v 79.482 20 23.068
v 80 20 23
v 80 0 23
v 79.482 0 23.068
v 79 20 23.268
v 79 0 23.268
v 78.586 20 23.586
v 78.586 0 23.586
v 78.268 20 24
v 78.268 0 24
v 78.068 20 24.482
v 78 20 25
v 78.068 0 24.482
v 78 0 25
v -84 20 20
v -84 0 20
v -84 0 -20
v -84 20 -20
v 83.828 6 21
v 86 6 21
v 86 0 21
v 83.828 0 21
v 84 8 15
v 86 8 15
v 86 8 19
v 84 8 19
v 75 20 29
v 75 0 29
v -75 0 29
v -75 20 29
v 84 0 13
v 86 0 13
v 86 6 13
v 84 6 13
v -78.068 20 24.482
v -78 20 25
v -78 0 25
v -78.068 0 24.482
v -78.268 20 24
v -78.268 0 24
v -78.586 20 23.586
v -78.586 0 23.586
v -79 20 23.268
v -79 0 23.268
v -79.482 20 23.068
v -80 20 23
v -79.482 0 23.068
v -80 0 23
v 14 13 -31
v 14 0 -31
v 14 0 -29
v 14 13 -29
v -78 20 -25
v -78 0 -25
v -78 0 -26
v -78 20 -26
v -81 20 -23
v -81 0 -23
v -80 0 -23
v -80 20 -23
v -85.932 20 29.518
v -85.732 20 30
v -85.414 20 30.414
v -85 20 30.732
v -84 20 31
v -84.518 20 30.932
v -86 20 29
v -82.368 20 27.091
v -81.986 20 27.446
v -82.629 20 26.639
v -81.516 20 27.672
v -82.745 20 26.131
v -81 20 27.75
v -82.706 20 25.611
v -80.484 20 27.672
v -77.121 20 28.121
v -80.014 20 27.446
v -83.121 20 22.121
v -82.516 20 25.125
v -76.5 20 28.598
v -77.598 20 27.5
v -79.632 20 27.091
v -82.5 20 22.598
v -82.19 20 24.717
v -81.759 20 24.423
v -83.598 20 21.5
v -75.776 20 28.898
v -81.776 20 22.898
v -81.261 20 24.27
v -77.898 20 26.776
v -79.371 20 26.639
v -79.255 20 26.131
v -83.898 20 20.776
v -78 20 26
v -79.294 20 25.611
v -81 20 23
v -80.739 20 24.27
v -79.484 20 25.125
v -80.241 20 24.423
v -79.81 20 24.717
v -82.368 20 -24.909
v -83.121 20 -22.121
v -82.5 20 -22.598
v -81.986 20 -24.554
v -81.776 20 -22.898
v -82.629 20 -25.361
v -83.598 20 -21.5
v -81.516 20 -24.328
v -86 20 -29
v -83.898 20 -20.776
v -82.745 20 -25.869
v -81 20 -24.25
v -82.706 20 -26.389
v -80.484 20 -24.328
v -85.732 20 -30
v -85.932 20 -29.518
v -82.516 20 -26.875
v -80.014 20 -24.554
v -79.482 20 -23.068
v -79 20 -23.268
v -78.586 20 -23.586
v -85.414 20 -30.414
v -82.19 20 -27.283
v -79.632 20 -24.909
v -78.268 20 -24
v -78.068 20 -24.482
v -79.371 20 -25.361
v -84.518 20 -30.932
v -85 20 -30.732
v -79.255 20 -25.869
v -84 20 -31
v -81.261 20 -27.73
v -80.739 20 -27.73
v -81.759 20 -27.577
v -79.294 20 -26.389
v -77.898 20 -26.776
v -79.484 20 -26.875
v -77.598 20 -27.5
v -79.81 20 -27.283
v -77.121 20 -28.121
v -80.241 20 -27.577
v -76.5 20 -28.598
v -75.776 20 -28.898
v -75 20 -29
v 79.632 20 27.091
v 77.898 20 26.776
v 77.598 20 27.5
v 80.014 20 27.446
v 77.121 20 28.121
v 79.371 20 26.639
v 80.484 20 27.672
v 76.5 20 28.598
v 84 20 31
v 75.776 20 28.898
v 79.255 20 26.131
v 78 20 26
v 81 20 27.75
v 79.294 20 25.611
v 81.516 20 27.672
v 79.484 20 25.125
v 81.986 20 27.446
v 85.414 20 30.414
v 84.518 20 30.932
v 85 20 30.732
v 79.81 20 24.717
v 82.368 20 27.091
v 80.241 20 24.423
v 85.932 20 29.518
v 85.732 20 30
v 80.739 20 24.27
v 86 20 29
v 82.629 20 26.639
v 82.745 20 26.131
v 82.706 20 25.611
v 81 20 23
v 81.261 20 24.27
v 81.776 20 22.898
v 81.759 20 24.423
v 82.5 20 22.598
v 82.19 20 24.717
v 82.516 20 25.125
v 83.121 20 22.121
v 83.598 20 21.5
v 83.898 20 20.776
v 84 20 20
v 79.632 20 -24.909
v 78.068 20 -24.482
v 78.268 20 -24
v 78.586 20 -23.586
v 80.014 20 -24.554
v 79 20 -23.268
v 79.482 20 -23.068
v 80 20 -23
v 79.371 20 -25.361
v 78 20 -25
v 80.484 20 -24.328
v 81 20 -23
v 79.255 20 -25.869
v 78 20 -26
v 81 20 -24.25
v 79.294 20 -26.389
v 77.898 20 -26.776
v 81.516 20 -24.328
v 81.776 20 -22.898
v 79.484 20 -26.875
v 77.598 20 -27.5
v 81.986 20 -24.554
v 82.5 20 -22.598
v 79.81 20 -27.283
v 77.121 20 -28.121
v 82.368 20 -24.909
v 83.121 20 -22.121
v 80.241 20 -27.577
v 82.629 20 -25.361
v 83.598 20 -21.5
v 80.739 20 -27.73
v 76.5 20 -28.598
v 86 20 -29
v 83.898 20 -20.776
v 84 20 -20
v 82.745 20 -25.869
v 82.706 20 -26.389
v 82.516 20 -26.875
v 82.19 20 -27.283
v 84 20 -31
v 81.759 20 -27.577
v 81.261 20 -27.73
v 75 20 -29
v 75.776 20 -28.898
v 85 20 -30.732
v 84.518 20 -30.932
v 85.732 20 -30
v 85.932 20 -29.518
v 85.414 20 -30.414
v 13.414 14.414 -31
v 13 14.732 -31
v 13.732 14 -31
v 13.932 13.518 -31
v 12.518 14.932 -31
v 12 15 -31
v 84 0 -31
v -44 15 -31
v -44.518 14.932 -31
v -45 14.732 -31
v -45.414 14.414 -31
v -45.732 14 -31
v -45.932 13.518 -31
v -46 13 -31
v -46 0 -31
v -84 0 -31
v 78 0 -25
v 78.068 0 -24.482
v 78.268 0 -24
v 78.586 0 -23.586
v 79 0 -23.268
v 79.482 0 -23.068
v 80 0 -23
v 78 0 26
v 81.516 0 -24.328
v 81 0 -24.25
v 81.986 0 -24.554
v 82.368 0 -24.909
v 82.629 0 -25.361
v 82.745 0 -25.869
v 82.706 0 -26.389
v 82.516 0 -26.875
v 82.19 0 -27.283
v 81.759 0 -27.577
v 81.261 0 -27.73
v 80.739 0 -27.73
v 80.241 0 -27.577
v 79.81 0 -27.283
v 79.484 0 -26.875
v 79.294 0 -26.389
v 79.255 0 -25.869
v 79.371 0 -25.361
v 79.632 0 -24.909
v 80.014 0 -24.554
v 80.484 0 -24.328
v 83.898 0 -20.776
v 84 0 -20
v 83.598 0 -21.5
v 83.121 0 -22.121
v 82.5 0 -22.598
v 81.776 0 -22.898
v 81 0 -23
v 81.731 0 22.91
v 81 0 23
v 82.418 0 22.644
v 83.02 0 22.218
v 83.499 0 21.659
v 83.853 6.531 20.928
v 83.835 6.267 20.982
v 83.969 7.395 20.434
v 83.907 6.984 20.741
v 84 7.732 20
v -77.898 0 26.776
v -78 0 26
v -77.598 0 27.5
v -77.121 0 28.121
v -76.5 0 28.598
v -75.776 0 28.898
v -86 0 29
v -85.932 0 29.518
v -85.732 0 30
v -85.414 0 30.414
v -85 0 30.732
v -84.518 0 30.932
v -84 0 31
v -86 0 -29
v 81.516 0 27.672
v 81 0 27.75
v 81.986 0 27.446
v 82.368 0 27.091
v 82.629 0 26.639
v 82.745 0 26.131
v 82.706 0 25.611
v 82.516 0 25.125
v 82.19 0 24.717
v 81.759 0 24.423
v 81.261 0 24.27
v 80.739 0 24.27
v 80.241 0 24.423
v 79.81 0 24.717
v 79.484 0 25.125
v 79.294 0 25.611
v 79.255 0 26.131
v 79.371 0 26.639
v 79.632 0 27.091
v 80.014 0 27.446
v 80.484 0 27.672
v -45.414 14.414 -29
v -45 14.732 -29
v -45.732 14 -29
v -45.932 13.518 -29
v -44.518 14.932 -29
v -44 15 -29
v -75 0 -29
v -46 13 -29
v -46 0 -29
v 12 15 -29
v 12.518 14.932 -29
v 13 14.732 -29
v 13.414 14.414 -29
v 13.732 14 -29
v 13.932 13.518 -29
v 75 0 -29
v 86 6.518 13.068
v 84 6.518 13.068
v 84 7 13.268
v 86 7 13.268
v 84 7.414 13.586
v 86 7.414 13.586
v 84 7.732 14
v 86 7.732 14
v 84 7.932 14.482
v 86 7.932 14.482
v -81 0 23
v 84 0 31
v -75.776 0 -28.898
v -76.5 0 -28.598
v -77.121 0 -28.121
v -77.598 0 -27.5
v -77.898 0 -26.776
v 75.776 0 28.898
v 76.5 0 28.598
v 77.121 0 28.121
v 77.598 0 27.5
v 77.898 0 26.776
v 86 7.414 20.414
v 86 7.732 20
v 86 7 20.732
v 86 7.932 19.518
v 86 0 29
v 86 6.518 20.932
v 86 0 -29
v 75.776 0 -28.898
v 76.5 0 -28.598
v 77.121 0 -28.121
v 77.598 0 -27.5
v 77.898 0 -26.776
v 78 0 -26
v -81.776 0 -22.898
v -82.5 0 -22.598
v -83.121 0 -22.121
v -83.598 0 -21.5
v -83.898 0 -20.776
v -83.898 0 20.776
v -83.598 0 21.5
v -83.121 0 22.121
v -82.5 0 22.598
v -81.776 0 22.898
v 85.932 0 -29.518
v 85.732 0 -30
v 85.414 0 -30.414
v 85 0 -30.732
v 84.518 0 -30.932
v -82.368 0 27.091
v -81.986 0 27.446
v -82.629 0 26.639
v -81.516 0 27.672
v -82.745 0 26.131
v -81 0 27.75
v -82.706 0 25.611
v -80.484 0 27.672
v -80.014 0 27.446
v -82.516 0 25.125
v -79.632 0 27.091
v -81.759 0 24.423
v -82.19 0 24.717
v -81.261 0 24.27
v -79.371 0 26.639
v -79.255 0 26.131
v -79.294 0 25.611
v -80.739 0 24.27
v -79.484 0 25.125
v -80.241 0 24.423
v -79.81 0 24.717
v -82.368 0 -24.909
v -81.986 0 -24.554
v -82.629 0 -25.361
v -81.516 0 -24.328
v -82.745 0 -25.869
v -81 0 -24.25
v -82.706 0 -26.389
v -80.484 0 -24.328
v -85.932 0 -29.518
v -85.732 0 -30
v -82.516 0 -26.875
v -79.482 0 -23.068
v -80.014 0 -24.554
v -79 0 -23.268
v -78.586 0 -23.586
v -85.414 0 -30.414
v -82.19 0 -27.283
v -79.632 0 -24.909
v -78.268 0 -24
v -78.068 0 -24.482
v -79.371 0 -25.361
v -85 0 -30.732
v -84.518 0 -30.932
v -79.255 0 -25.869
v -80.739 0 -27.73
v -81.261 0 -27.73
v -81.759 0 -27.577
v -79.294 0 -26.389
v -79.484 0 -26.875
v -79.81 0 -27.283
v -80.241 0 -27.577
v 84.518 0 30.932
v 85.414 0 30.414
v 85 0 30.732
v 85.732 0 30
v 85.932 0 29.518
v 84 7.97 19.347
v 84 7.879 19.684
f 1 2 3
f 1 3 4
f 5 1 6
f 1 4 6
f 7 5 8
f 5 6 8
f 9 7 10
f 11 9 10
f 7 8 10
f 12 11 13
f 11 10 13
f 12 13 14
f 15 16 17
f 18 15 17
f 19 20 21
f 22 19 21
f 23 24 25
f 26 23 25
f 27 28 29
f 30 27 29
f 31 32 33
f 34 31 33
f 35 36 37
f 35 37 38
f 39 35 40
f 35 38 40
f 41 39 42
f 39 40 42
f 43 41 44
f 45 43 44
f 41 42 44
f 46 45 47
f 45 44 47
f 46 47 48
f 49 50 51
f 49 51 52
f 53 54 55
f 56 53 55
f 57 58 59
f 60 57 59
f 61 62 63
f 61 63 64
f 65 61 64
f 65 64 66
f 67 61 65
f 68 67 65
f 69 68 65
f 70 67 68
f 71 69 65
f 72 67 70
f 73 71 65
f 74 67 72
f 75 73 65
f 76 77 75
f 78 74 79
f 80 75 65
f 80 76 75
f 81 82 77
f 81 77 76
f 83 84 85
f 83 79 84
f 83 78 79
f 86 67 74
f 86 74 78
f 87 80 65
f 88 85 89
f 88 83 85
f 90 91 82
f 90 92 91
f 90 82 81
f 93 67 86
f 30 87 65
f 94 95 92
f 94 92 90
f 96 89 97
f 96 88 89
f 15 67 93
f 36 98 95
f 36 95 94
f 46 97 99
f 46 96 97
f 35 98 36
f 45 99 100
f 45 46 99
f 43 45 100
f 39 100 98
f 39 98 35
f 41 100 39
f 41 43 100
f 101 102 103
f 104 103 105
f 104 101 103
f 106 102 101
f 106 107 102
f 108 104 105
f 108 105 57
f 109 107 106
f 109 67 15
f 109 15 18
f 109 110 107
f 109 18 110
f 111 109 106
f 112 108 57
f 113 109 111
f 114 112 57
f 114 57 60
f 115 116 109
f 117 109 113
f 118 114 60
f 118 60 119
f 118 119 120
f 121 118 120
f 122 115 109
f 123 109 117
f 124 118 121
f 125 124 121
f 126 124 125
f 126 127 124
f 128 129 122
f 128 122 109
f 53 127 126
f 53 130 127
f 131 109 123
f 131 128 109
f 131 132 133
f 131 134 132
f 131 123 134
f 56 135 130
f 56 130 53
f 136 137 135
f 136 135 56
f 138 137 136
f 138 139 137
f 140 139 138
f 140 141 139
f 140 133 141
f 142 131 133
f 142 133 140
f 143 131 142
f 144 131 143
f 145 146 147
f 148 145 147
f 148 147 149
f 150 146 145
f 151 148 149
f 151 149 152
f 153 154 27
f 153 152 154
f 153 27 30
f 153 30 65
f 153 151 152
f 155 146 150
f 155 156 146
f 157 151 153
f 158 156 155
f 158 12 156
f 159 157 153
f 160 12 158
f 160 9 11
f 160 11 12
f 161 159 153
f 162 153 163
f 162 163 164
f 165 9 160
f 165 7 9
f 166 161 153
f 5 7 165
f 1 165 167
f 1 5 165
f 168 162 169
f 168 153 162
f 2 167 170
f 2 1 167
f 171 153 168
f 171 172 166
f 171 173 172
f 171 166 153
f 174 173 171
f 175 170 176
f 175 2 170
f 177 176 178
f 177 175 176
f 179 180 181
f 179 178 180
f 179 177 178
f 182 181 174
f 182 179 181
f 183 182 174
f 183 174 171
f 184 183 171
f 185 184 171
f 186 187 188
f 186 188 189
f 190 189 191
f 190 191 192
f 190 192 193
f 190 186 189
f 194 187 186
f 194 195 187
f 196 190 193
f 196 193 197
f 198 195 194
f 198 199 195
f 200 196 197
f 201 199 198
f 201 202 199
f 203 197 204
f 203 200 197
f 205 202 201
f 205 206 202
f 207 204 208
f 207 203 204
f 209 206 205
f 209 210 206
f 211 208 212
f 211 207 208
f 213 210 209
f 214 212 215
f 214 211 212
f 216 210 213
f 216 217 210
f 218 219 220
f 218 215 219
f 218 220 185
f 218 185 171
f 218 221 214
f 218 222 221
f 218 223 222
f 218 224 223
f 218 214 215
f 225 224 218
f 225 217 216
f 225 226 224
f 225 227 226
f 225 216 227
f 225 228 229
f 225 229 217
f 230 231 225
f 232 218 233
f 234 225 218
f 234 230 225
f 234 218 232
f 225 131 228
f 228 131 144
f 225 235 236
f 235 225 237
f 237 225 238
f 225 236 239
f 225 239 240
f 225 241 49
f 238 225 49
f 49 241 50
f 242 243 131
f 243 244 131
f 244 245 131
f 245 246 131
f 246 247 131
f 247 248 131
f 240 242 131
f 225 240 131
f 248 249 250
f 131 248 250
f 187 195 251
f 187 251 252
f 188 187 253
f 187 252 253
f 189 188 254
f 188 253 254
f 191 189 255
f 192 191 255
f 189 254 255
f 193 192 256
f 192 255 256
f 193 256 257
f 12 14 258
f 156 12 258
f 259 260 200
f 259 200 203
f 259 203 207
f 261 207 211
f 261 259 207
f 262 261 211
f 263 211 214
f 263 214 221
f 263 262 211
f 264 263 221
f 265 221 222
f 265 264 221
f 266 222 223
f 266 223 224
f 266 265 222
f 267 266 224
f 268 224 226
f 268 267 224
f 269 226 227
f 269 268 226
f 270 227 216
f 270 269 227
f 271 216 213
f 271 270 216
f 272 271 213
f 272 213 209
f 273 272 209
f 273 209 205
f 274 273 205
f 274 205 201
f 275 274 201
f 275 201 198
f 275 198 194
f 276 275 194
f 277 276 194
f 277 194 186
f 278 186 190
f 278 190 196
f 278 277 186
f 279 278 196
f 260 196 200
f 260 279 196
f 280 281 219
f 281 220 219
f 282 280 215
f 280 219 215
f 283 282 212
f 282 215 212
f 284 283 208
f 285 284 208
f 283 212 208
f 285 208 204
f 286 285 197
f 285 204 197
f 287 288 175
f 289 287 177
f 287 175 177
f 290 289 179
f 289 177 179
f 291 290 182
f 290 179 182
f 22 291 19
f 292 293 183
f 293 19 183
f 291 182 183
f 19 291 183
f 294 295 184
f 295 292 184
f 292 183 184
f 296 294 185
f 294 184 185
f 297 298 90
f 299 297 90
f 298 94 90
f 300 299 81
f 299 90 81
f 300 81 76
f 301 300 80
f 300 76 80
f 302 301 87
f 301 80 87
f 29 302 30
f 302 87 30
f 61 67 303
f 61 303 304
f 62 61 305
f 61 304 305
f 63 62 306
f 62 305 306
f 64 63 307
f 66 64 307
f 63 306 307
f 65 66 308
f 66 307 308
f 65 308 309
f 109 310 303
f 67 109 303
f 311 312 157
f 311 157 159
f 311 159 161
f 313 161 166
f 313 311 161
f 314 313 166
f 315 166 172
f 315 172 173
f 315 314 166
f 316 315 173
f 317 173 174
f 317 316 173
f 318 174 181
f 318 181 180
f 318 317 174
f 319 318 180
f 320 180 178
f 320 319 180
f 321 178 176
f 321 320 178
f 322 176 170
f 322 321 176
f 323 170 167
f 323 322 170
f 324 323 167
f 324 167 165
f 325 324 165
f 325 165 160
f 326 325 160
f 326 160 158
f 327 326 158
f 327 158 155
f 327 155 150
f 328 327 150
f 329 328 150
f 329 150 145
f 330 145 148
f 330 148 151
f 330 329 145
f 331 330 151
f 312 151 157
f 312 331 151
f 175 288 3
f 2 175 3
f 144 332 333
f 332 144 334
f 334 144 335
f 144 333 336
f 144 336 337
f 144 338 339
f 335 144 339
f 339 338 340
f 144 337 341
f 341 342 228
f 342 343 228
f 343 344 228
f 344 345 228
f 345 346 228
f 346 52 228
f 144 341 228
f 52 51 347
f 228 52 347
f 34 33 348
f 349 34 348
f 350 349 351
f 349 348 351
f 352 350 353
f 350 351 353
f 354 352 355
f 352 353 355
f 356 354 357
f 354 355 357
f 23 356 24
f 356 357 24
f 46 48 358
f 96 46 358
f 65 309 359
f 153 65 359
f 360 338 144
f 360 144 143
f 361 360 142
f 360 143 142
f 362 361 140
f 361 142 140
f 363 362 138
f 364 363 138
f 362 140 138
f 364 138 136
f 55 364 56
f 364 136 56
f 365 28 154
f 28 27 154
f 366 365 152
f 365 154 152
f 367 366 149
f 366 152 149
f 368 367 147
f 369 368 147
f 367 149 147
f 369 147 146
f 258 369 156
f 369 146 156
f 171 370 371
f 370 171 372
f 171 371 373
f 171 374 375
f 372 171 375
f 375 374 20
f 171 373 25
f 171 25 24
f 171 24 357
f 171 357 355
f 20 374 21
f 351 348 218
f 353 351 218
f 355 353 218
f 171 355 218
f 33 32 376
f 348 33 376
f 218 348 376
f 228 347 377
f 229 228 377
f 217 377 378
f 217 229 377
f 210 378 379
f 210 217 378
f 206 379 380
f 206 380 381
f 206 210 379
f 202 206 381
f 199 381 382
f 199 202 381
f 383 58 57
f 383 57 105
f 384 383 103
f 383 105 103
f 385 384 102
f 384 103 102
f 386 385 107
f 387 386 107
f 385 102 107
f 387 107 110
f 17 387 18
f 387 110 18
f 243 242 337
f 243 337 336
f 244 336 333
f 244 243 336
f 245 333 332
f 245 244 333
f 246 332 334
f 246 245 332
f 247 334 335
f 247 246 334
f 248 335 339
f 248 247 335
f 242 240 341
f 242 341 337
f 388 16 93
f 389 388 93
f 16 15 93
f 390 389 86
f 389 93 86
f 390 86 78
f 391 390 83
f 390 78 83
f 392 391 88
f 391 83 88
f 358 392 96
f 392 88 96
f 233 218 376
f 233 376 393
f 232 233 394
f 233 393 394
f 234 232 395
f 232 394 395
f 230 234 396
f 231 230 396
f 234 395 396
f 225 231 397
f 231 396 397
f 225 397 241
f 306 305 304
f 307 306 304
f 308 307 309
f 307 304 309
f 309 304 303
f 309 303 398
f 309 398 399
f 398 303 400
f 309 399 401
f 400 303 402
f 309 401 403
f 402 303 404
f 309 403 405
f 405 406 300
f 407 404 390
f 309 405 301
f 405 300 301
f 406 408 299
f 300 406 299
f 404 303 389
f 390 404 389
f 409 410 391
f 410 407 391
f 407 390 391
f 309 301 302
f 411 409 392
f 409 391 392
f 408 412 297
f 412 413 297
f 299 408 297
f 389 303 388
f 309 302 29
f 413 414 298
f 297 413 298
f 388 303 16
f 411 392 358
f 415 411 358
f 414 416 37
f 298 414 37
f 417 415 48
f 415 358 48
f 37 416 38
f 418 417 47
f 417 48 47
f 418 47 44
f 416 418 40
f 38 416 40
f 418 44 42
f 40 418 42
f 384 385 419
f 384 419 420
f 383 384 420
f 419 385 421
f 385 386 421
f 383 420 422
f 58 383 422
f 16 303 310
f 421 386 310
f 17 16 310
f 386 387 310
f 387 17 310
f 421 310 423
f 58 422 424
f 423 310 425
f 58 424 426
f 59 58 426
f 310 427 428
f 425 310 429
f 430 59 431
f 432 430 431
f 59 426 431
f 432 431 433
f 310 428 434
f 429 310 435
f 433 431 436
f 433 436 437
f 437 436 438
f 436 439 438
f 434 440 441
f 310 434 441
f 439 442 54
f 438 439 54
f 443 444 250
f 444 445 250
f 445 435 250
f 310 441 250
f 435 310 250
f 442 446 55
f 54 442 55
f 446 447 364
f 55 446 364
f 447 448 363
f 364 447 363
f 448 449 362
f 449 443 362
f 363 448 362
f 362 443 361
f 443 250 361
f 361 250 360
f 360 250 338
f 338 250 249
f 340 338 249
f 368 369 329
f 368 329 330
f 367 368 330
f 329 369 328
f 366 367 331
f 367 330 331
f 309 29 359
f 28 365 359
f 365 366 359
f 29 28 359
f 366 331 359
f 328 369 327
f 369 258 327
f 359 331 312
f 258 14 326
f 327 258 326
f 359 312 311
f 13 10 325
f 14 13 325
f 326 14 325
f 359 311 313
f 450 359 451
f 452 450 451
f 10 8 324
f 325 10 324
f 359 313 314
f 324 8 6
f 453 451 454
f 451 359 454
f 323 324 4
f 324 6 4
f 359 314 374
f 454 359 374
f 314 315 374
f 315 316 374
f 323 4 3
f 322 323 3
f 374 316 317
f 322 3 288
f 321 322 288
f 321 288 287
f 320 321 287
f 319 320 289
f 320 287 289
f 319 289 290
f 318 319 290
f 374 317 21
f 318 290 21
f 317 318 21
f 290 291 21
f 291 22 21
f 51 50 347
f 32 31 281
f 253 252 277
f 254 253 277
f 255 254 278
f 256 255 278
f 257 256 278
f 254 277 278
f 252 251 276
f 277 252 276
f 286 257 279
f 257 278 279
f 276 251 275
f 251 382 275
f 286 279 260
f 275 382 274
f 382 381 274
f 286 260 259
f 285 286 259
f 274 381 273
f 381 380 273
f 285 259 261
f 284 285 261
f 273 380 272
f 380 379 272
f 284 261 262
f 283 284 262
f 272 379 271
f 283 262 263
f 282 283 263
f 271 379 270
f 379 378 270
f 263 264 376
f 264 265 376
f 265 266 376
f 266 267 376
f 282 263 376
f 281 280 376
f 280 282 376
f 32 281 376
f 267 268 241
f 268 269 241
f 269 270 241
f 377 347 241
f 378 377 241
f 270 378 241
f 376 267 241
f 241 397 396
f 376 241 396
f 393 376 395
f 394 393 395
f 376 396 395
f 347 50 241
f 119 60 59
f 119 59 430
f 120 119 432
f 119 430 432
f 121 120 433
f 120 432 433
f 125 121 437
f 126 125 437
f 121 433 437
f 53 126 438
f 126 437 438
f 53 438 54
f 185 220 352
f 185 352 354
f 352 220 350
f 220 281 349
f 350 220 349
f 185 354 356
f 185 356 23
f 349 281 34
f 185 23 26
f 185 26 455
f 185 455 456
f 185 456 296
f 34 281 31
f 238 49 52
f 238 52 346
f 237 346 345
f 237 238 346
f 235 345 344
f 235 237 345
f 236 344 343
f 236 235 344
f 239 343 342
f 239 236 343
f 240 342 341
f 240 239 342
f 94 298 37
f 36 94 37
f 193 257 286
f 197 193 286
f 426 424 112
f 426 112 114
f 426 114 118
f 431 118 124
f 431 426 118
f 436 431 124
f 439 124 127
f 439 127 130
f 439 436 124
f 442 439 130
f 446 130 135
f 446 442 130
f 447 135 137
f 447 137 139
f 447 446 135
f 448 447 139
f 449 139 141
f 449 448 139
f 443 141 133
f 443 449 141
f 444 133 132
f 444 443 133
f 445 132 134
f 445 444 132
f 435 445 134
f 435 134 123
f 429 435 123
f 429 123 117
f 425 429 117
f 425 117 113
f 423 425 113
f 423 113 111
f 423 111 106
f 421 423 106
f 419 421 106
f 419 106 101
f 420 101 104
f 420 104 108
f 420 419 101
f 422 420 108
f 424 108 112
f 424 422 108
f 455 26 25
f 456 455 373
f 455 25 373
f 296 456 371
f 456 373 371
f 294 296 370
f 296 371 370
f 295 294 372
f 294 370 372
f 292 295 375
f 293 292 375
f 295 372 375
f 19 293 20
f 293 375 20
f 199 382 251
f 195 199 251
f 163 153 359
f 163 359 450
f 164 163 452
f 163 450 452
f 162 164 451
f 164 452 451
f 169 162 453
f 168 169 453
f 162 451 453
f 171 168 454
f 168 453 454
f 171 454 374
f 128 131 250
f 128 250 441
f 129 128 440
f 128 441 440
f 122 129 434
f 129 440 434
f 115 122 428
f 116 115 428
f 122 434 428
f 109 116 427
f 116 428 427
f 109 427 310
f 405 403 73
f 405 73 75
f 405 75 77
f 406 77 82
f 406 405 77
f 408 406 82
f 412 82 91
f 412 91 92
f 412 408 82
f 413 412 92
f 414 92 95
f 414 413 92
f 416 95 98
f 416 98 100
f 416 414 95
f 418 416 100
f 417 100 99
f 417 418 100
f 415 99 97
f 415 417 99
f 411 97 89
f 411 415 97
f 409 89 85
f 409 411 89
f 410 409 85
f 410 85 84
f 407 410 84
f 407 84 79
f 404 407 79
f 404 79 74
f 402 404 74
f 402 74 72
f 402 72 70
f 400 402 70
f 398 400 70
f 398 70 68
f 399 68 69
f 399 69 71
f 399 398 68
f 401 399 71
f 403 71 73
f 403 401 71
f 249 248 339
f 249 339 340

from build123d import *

# Parameters (mm, degrees)
SKETCH1_R           = 1.75
BOSS_EXTRUDE1_DEPTH = 20
CUT_EXTRUDE1_DEPTH  = 20
FILLET1_R           = 3
CUT_EXTRUDE5_DEPTH  = 10


with BuildPart() as part:
    # Sketch1 → Boss-Extrude1 (new body)
    with BuildSketch(Plane(origin=(0, 0, 0), x_dir=(1, 0, 0), z_dir=(0, 1, 0))):
        with BuildLine():
            Line((-86, 29), (-86, -29))
            ThreePointArc((-86, -29), (-85.414213562, -30.414213562), (-84, -31))
            Line((-84, -31), (84, -31))
            ThreePointArc((84, -31), (85.414213562, -30.414213562), (86, -29))
            Line((86, -29), (86, 29))
            ThreePointArc((86, 29), (85.414213562, 30.414213562), (84, 31))
            Line((84, 31), (-84, 31))
            ThreePointArc((-84, 31), (-85.414213562, 30.414213562), (-86, 29))
        make_face()
        with Locations(Location((-81, 26, 0), (0, 0, 270))):  # turned: the seam where the file's is
            Circle(SKETCH1_R, mode=Mode.SUBTRACT)
        with Locations(Location((-81, -26, 0), (0, 0, 270))):  # turned: the seam where the file's is
            Circle(SKETCH1_R, mode=Mode.SUBTRACT)
        with Locations(Location((81, -26, 0), (0, 0, 270))):  # turned: the seam where the file's is
            Circle(SKETCH1_R, mode=Mode.SUBTRACT)
        with Locations(Location((81, 26, 0), (0, 0, 270))):  # turned: the seam where the file's is
            Circle(SKETCH1_R, mode=Mode.SUBTRACT)
        with BuildLine():
            Line((84, -23), (80, -23))
            ThreePointArc((80, -23), (78.585786438, -23.585786438), (78, -25))
            Line((78, -25), (78, -29))
            Line((78, -29), (-78, -29))
            Line((-78, -29), (-78, -25))
            ThreePointArc((-78, -25), (-78.585786438, -23.585786438), (-80, -23))
            Line((-80, -23), (-84, -23))
            Line((-84, -23), (-84, 23))
            Line((-84, 23), (-80, 23))
            ThreePointArc((-80, 23), (-78.585786438, 23.585786438), (-78, 25))
            Line((-78, 25), (-78, 29))
            Line((-78, 29), (78, 29))
            Line((78, 29), (78, 25))
            ThreePointArc((78, 25), (78.585786438, 23.585786438), (80, 23))
            Line((80, 23), (84, 23))
            Line((84, 23), (84, -23))
        make_face(mode=Mode.SUBTRACT)
    extrude(amount=BOSS_EXTRUDE1_DEPTH)

    # Sketch2 → Cut-Extrude1 (cut)
    with BuildSketch(Plane(origin=(0, 0, -31), x_dir=(-1, 0, 0), z_dir=(0, 0, -1))):
        with BuildLine():
            Line((-12, 15), (44, 15))
            ThreePointArc((44, 15), (45.414213562, 14.414213562), (46, 13))
            Line((46, 13), (46, -3))
            Line((46, -3), (-14, -3))
            Line((-14, -3), (-14, 13))
            ThreePointArc((-14, 13), (-13.414213562, 14.414213562), (-12, 15))
        make_face()
    extrude(amount=-CUT_EXTRUDE1_DEPTH, mode=Mode.SUBTRACT)

    # Fillet1
    fillet1_edges = [part.edges().sort_by_distance(p)[0] for p in [
        (84, 10, 23),
        (84, 10, -23),
        (78, 10, -29),
        (-78, 10, -29),
        (-84, 10, -23),
        (-84, 10, 23),
        (-78, 10, 29),
        (78, 10, 29),
    ]]
    fillet(fillet1_edges, radius=FILLET1_R)

    # Sketch3 → Cut-Extrude5 (cut)
    with BuildSketch(Plane(origin=(86, 0, 0), x_dir=(0, 0, -1), z_dir=(1, 0, 0))):
        with BuildLine():
            Line((-13, 0), (-13, 6))
            ThreePointArc((-13, 6), (-13.585786438, 7.414213562), (-15, 8))
            Line((-15, 8), (-19, 8))
            ThreePointArc((-19, 8), (-20.414213562, 7.414213562), (-21, 6))
            Line((-21, 6), (-21, 0))
            Line((-21, 0), (-13, 0))
        make_face()
    extrude(amount=-CUT_EXTRUDE5_DEPTH, mode=Mode.SUBTRACT)


solid = part.part
